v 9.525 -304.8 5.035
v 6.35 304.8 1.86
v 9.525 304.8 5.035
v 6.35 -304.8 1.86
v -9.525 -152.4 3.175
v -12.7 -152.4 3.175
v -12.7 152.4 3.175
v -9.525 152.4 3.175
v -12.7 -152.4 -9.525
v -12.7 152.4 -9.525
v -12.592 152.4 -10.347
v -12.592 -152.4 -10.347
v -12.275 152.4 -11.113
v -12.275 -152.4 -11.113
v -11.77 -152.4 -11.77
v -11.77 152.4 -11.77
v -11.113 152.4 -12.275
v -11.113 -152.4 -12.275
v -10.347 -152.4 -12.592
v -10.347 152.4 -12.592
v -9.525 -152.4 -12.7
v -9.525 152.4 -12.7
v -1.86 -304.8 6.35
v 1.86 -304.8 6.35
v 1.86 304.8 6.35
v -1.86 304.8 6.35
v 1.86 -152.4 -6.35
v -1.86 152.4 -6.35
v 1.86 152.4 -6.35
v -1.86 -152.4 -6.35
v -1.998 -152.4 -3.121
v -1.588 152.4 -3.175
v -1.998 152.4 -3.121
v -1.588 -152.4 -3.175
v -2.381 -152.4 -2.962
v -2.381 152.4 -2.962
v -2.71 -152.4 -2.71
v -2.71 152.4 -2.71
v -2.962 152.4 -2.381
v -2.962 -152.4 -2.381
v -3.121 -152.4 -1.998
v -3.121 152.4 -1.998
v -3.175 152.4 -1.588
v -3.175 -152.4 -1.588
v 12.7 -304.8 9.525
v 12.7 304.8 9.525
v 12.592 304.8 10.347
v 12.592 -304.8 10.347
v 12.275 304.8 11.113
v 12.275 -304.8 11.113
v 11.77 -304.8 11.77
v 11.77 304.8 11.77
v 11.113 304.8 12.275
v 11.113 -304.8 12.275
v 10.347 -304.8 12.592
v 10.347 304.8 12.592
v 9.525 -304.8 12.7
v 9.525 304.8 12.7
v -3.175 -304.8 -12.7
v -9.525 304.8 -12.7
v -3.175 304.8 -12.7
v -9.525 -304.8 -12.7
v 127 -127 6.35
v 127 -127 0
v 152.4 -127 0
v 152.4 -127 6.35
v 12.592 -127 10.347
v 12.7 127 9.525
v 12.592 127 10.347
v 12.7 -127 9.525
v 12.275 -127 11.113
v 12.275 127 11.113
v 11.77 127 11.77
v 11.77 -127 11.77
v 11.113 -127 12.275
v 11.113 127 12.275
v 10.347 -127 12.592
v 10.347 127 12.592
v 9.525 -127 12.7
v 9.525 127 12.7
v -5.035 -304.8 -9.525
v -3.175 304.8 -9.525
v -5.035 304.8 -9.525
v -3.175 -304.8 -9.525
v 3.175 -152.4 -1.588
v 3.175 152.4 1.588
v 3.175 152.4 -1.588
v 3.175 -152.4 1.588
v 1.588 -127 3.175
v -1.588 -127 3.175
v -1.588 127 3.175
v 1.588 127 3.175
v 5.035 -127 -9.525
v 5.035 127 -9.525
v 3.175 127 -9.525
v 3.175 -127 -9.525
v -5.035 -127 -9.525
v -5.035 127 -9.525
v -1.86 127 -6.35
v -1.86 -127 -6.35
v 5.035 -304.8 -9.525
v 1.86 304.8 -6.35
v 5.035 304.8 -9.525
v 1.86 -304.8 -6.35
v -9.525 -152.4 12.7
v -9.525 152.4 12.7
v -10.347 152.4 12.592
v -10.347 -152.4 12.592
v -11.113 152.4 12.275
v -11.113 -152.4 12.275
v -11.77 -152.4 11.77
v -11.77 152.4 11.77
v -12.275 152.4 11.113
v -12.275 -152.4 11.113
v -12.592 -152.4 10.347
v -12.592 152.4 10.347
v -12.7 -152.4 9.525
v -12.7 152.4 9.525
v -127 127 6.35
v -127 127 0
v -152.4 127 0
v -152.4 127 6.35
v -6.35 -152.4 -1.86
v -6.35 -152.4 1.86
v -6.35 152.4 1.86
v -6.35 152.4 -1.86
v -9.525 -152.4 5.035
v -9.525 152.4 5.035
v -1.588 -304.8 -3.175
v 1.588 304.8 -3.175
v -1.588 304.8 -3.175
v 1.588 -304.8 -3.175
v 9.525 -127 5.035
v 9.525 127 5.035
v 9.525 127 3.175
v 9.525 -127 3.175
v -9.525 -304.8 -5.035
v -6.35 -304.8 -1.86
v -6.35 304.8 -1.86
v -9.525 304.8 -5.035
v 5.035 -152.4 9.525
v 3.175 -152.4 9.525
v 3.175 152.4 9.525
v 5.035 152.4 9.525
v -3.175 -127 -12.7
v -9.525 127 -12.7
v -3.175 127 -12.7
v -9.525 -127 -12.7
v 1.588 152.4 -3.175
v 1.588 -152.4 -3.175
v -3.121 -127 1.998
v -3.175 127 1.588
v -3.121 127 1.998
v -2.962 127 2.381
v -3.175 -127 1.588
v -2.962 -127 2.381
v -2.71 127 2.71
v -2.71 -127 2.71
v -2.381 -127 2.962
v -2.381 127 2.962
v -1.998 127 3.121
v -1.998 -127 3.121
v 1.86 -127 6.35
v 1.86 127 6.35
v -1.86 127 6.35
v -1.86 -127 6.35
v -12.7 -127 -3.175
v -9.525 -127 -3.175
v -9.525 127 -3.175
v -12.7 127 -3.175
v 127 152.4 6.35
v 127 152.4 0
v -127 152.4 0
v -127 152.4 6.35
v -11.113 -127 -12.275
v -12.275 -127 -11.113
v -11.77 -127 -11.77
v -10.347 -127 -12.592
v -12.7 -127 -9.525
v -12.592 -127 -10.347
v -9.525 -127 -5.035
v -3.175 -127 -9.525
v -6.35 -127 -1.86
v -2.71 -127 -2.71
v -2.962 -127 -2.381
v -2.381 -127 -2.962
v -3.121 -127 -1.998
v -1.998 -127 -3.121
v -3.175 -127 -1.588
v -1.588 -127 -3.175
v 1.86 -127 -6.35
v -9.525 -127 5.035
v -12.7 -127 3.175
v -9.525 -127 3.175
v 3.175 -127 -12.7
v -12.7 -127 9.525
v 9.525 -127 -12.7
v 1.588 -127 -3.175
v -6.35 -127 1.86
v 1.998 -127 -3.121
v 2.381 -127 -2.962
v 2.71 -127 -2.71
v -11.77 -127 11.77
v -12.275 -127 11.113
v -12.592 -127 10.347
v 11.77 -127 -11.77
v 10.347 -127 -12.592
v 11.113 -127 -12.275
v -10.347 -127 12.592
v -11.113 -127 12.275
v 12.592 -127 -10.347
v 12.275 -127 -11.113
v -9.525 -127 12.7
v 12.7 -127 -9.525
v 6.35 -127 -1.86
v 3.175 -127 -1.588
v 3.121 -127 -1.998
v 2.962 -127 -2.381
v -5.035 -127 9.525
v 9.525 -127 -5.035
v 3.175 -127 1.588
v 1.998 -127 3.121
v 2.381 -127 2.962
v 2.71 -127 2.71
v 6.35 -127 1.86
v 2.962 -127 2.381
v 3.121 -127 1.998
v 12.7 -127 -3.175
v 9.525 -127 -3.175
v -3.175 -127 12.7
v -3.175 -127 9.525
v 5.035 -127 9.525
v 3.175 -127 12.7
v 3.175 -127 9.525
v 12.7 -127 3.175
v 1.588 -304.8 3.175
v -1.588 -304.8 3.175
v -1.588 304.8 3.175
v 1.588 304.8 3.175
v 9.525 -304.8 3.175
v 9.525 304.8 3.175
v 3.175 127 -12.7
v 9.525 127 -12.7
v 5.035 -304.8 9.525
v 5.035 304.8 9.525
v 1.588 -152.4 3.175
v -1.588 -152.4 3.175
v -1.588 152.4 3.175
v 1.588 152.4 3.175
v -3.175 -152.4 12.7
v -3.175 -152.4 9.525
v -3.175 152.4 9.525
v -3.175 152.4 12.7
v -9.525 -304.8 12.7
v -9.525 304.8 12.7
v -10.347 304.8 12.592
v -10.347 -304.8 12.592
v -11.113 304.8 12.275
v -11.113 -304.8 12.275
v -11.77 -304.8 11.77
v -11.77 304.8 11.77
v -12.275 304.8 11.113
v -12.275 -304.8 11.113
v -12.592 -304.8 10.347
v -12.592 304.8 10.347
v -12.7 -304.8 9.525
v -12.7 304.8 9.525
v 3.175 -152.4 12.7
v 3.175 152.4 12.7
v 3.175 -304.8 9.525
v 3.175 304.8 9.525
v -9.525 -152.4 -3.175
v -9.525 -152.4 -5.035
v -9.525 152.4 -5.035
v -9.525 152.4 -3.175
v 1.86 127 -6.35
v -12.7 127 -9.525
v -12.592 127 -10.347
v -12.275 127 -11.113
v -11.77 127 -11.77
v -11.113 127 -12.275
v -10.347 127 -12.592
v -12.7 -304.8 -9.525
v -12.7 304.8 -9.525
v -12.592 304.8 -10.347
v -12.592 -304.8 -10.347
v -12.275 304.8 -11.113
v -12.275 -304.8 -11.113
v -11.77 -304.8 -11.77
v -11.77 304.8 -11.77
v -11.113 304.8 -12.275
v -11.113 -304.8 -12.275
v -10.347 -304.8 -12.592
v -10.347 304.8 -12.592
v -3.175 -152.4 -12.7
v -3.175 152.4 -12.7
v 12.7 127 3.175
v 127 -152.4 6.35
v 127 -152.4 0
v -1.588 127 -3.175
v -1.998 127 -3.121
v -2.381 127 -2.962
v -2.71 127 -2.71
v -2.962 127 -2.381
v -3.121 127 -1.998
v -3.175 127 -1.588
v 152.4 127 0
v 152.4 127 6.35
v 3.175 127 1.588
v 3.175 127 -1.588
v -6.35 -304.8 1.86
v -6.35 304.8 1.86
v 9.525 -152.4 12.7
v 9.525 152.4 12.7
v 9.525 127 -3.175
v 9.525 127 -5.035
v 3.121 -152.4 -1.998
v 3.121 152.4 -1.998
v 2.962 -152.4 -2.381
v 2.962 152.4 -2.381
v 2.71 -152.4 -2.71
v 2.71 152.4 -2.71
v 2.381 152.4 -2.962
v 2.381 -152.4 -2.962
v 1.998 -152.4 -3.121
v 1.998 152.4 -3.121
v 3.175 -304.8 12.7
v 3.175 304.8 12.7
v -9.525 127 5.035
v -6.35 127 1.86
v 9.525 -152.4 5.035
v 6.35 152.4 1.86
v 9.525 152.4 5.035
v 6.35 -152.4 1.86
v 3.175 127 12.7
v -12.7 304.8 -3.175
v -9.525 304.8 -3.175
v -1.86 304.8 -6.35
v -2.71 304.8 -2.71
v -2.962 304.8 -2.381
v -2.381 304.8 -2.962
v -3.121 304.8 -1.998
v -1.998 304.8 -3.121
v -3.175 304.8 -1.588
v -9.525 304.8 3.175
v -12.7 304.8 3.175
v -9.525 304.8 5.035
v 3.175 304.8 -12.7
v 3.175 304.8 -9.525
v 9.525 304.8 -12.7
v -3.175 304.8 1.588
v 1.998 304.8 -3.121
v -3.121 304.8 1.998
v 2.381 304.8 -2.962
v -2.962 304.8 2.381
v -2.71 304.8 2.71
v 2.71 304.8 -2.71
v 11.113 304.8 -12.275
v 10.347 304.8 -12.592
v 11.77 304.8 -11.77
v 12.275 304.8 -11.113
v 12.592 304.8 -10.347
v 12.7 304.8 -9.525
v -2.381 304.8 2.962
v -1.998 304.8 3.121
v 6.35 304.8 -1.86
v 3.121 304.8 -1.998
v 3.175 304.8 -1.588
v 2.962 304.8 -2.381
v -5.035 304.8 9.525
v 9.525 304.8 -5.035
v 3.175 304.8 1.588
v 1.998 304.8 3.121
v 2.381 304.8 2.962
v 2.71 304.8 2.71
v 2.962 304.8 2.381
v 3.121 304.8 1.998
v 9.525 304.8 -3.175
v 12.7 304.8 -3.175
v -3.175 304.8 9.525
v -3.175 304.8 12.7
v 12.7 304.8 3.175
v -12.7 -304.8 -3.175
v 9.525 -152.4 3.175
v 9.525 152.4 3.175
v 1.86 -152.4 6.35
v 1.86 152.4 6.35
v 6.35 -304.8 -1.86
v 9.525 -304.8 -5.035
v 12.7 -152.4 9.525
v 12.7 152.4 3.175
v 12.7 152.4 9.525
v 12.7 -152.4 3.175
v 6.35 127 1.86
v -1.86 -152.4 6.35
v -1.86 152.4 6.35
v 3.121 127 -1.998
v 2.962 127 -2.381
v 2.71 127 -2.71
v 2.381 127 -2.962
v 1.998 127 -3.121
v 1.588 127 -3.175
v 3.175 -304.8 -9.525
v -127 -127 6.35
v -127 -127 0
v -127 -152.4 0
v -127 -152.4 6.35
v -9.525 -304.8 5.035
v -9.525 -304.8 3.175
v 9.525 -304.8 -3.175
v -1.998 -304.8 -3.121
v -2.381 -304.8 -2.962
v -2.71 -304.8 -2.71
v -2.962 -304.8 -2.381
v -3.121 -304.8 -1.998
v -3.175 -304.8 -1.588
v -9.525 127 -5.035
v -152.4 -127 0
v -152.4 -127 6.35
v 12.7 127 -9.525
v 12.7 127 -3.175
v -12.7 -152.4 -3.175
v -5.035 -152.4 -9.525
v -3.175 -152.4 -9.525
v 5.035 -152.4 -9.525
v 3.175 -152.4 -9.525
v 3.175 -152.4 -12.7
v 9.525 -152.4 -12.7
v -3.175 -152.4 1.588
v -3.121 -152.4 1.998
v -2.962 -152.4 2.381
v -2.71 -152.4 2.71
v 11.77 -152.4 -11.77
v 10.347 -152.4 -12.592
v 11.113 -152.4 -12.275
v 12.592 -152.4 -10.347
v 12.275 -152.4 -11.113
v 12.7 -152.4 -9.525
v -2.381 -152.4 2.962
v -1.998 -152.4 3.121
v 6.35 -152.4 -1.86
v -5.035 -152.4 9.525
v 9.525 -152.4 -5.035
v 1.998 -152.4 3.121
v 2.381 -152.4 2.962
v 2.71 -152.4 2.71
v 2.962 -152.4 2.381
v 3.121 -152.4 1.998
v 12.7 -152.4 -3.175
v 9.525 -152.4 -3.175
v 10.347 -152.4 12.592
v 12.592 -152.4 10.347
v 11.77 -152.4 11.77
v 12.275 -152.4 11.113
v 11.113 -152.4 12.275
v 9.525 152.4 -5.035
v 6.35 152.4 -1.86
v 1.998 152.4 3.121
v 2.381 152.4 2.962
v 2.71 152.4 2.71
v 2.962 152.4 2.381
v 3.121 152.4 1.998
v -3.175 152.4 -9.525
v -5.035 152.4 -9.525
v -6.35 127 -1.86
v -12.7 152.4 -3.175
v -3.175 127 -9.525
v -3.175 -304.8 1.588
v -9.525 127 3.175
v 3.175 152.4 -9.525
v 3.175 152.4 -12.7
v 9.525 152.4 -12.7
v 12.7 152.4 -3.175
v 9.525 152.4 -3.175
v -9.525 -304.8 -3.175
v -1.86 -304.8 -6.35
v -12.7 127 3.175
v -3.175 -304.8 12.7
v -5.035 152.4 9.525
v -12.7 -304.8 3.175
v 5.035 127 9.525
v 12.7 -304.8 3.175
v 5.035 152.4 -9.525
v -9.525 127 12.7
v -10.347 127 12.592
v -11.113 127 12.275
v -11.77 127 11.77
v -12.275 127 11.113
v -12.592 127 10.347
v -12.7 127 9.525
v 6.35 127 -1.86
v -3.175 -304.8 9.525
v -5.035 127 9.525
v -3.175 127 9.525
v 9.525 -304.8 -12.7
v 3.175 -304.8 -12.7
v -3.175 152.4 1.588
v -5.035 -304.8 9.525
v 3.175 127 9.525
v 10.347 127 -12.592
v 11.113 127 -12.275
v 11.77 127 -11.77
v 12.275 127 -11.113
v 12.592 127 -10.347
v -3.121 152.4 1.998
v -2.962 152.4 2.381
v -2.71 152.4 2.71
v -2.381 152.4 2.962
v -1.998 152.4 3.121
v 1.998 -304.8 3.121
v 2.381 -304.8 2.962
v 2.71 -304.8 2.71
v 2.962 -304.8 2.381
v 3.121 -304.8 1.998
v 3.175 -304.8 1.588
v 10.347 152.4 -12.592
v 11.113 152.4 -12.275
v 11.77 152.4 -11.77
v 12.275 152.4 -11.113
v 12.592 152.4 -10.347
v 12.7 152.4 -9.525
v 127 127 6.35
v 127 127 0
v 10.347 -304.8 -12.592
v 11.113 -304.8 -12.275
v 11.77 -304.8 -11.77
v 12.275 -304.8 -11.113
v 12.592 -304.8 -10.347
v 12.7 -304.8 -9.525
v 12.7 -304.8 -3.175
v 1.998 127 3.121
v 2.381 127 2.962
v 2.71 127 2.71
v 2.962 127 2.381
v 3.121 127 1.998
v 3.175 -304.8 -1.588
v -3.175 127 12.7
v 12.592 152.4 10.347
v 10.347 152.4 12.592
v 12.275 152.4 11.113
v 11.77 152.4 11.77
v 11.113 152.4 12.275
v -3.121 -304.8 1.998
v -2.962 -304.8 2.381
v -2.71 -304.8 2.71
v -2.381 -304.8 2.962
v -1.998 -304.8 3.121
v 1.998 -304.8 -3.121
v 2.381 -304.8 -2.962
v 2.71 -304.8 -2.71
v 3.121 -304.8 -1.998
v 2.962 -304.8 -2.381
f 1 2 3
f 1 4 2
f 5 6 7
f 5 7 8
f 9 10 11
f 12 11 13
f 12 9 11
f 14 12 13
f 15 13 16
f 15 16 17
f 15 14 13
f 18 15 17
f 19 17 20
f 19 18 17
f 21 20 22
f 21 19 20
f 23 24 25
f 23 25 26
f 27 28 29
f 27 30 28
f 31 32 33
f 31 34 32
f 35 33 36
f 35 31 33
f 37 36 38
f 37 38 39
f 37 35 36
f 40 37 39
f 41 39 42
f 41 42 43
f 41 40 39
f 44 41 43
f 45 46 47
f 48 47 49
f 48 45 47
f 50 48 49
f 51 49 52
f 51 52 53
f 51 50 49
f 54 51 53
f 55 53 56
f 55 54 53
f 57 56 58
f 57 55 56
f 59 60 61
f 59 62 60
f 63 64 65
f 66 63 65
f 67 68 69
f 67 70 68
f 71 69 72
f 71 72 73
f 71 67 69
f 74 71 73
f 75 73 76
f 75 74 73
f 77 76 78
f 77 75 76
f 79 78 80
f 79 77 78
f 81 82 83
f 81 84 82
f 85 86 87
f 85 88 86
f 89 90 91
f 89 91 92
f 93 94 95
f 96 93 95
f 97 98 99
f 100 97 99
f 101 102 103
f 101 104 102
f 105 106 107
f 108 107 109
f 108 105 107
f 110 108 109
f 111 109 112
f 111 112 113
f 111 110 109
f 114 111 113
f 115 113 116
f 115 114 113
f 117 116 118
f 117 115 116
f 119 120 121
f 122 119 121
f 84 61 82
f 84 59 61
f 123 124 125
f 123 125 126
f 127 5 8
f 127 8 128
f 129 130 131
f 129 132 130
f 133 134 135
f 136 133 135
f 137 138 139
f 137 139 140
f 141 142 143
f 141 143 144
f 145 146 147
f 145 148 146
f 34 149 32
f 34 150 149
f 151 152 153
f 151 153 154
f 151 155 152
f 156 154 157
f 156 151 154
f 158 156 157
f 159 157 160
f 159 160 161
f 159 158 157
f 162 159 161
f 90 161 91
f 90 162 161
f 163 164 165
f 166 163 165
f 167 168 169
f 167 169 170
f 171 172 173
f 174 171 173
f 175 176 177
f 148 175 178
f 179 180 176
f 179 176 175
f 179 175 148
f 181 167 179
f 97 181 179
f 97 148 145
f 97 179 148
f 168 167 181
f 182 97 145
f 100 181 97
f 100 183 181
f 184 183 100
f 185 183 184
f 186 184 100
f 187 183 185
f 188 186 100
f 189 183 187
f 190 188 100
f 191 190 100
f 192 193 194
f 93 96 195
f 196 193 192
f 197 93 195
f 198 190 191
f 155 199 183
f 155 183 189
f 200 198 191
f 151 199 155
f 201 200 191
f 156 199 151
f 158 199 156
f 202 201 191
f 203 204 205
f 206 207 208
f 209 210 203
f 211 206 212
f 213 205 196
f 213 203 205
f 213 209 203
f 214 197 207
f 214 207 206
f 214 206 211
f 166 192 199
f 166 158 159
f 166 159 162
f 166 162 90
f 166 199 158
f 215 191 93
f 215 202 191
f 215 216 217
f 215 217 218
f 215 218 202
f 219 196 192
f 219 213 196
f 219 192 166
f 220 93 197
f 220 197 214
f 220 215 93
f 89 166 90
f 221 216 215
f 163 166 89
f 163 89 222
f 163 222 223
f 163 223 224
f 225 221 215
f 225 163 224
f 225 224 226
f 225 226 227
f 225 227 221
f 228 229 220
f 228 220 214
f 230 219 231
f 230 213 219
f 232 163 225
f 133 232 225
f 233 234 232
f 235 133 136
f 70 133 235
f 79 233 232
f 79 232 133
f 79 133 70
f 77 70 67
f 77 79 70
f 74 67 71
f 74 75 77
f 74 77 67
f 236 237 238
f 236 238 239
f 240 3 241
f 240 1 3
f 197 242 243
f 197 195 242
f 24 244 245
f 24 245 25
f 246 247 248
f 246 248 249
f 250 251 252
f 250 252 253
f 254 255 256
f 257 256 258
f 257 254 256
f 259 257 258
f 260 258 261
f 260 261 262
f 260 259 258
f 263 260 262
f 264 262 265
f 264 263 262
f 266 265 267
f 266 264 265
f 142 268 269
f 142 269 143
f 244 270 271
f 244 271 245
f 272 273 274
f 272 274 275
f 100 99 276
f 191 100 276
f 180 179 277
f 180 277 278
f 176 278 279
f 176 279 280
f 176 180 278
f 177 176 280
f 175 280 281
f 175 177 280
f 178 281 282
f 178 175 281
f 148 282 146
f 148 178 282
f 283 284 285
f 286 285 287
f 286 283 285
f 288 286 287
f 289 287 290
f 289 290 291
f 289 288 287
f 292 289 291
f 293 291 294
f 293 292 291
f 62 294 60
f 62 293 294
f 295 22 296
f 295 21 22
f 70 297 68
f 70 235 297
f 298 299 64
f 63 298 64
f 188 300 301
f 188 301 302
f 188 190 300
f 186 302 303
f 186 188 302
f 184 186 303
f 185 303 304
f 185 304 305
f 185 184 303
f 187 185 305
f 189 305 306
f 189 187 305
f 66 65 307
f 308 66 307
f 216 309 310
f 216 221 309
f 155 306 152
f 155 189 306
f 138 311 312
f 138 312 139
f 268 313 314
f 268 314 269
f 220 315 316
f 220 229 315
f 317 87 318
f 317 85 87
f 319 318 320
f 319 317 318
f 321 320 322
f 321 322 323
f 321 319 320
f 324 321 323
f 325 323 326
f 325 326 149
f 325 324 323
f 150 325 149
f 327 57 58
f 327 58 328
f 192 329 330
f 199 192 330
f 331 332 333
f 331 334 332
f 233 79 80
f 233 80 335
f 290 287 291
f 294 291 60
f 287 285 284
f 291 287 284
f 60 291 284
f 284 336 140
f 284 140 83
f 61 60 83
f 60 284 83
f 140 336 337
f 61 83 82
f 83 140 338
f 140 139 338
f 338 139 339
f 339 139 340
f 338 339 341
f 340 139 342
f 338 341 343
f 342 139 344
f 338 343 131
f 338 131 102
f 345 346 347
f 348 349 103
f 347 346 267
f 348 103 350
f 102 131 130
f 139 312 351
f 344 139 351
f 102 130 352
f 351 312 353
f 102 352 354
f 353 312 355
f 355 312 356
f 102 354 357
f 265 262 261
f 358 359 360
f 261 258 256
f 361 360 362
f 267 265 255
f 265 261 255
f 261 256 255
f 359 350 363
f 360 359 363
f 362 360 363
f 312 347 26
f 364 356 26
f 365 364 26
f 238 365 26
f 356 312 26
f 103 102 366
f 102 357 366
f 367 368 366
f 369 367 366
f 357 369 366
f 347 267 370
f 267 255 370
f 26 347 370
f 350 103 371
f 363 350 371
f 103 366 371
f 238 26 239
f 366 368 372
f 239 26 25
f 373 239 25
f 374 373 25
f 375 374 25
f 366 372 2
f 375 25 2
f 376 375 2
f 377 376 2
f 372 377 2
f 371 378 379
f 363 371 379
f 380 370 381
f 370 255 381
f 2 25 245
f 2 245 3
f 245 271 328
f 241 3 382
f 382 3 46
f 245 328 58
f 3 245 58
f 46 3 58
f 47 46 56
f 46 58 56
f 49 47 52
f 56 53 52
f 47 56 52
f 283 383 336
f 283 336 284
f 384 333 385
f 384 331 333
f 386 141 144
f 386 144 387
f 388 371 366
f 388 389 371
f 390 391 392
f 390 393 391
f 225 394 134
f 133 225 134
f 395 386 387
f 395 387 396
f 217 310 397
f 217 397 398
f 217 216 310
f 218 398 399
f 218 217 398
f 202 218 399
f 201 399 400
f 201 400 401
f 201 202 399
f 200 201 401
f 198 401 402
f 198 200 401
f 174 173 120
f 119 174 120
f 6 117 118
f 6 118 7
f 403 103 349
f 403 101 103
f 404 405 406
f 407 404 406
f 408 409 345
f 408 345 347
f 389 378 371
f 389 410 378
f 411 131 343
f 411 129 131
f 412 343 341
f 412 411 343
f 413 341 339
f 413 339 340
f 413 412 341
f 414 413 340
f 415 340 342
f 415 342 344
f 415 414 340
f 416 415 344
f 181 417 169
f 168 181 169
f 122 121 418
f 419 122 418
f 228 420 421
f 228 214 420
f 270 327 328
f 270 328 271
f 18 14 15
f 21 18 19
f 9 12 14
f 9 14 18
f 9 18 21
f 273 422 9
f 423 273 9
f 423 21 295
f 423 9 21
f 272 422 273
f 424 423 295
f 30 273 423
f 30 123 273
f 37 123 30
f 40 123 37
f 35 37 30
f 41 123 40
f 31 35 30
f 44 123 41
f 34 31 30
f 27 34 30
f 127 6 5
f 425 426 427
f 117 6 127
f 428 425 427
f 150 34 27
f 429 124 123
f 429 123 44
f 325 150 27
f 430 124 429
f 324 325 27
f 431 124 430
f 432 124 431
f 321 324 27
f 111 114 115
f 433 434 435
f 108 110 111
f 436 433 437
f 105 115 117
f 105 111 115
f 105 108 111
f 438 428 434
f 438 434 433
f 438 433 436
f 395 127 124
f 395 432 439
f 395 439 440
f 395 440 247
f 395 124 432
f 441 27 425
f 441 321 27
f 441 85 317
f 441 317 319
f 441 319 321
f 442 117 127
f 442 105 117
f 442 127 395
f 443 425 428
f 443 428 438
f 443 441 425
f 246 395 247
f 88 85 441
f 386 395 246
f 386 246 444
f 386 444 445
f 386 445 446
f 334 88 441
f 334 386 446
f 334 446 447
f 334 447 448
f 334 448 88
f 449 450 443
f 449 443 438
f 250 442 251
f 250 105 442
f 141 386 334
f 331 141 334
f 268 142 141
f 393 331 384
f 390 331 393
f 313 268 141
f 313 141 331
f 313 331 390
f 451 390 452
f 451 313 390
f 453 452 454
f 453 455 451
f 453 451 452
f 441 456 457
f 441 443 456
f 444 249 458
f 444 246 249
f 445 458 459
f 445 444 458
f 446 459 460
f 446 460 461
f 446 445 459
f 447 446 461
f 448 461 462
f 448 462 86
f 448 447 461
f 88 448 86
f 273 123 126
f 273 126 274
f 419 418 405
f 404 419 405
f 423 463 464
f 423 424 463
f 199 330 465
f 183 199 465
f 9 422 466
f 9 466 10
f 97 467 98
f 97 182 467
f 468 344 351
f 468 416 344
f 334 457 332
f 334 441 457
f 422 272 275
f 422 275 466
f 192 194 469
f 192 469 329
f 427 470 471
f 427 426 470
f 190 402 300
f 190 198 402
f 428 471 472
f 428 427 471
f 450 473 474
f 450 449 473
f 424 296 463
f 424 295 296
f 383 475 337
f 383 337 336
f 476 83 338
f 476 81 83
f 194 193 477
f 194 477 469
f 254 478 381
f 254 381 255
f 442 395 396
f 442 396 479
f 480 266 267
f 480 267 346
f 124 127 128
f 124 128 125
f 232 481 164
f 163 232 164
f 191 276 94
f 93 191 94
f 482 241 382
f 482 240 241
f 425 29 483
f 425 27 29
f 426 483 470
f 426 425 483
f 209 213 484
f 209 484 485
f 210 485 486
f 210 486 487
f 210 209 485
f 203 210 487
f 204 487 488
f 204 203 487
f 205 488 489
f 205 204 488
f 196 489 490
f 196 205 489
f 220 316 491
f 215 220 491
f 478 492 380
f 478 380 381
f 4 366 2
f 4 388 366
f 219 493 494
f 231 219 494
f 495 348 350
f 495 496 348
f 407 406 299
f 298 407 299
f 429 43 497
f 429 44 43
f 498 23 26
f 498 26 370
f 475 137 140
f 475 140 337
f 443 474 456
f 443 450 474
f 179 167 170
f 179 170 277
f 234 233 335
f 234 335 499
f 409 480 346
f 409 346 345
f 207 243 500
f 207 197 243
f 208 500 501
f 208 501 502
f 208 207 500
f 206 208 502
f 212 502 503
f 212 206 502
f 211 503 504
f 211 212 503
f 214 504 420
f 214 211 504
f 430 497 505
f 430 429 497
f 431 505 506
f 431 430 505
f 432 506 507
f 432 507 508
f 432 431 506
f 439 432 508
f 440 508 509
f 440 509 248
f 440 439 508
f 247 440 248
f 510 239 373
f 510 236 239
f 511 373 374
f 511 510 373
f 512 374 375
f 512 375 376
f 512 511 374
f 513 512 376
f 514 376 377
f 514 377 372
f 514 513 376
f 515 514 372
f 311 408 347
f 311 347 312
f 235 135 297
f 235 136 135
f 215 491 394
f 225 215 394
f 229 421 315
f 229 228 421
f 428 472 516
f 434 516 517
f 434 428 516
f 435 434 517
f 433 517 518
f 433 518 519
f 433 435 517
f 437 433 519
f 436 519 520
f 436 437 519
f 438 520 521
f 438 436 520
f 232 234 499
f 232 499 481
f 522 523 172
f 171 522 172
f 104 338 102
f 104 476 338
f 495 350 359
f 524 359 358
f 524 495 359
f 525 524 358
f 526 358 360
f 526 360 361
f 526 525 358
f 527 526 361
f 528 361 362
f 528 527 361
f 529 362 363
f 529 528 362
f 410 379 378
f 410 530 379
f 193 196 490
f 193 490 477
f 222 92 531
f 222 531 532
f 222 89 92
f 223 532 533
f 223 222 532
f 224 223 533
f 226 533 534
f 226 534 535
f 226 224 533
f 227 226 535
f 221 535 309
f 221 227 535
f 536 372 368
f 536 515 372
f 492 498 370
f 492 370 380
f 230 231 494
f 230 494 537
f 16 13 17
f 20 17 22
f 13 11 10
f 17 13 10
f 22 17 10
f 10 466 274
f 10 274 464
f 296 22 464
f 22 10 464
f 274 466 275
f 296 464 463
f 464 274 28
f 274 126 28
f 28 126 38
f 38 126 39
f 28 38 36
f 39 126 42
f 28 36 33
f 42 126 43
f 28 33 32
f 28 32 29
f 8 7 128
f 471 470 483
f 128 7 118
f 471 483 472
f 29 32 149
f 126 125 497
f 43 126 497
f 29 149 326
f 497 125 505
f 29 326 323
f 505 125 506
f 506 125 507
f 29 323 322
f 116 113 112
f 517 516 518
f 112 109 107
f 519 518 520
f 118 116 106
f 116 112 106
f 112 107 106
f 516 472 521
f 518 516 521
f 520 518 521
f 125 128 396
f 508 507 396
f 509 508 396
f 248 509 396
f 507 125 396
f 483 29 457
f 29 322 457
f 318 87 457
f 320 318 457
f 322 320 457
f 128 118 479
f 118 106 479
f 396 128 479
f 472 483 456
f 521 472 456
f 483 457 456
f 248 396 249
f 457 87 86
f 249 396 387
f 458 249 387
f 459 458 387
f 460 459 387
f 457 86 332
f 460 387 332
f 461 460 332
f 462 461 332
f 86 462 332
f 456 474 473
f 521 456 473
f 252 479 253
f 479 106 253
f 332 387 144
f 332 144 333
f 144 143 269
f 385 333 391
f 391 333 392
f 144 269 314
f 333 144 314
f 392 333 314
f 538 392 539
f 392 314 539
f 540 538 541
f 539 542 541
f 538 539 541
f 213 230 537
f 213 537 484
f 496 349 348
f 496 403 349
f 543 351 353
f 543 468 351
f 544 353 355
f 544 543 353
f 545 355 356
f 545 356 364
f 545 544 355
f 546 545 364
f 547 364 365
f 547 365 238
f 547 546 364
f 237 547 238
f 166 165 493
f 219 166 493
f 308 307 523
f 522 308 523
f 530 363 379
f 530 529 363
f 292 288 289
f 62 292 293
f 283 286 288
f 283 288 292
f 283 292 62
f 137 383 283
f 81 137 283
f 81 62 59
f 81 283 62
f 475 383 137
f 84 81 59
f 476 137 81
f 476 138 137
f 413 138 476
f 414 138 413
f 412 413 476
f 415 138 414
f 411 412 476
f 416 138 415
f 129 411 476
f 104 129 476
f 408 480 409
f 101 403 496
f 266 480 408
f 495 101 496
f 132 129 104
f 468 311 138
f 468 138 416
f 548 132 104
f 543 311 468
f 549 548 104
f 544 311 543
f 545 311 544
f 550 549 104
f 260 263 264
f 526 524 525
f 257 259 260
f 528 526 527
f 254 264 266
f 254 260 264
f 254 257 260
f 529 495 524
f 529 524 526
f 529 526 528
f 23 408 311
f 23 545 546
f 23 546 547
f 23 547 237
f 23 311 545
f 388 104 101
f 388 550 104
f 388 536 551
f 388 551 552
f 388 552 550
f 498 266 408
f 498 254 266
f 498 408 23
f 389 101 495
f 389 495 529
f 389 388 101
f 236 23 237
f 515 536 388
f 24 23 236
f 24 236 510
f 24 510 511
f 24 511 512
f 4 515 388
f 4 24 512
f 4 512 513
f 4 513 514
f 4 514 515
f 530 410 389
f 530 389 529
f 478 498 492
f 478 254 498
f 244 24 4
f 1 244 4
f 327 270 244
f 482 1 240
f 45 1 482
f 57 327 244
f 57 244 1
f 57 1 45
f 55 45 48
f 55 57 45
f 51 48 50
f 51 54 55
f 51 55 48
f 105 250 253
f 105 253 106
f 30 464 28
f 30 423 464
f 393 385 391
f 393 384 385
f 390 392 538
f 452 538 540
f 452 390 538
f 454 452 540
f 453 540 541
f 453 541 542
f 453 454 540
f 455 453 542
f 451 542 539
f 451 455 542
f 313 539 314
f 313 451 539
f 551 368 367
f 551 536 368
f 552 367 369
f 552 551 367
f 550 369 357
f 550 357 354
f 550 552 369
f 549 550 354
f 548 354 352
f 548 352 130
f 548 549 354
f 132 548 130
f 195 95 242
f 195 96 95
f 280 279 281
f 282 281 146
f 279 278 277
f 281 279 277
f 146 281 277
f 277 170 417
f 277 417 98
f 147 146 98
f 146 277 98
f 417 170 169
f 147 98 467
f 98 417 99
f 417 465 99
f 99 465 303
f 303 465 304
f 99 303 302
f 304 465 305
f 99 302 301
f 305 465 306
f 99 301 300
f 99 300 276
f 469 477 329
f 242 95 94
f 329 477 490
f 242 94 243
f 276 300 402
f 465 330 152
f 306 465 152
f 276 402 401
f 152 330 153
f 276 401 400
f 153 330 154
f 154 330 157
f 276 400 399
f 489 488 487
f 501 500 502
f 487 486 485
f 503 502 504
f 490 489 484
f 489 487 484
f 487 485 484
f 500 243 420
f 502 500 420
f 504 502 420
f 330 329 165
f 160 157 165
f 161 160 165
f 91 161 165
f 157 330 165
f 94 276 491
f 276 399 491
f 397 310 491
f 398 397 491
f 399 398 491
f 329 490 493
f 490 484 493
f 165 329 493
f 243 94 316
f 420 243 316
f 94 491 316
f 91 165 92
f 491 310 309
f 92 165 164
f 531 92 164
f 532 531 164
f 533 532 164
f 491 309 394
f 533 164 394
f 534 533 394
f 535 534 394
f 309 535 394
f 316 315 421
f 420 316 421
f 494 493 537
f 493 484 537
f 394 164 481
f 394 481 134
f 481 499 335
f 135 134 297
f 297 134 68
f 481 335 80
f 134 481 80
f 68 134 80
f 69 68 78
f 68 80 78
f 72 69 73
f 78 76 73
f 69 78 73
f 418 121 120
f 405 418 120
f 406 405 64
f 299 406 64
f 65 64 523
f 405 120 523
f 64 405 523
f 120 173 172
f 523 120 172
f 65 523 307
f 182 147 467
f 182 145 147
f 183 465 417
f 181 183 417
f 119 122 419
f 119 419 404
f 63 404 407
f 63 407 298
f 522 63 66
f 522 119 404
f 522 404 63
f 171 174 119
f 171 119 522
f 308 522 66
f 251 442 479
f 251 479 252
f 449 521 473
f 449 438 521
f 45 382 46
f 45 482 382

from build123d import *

# Parameters (mm, degrees)
F2_DEPTH = 127
F4_DEPTH = 304.8
F6_DEPTH = 152.4
F8_DEPTH = 6.35


with BuildPart() as f2:
    # F0 (on Front) → F2 (new body, symmetric)
    with BuildSketch(Plane.XZ):
        with BuildLine():
            ThreePointArc((12.7, 9.525), (11.7700640303, 11.7700640303), (9.525, 12.7))
            Line((9.525, 12.7), (3.175, 12.7))
            Line((3.175, 12.7), (3.175, 9.525))
            Line((3.175, 9.525), (5.0348719395, 9.525))
            Line((5.0348719395, 9.525), (1.8598719395, 6.35))
            Line((1.8598719395, 6.35), (0, 6.35))
            Line((0, 6.35), (-1.8598719395, 6.35))
            Line((-1.8598719395, 6.35), (-5.0348719395, 9.525))
            Line((-5.0348719395, 9.525), (-3.175, 9.525))
            Line((-3.175, 9.525), (-3.175, 12.7))
            Line((-3.175, 12.7), (-9.525, 12.7))
            ThreePointArc((-9.525, 12.7), (-11.7700640303, 11.7700640303), (-12.7, 9.525))
            Line((-12.7, 9.525), (-12.7, 3.175))
            Line((-12.7, 3.175), (-9.525, 3.175))
            Line((-9.525, 3.175), (-9.525, 5.0348719395))
            Line((-9.525, 5.0348719395), (-6.35, 1.8598719395))
            Line((-6.35, 1.8598719395), (-6.35, 0))
            Line((-6.35, 0), (-6.35, -1.8598719395))
            Line((-6.35, -1.8598719395), (-9.525, -5.0348719395))
            Line((-9.525, -5.0348719395), (-9.525, -3.175))
            Line((-9.525, -3.175), (-12.7, -3.175))
            Line((-12.7, -3.175), (-12.7, -9.525))
            ThreePointArc((-12.7, -9.525), (-11.7700640303, -11.7700640303), (-9.525, -12.7))
            Line((-9.525, -12.7), (-3.175, -12.7))
            Line((-3.175, -12.7), (-3.175, -9.525))
            Line((-3.175, -9.525), (-5.0348719395, -9.525))
            Line((-5.0348719395, -9.525), (-1.8598719395, -6.35))
            Line((-1.8598719395, -6.35), (0, -6.35))
            Line((0, -6.35), (1.8598719395, -6.35))
            Line((1.8598719395, -6.35), (5.0348719395, -9.525))
            Line((5.0348719395, -9.525), (3.175, -9.525))
            Line((3.175, -9.525), (3.175, -12.7))
            Line((3.175, -12.7), (9.525, -12.7))
            ThreePointArc((9.525, -12.7), (11.7700640303, -11.7700640303), (12.7, -9.525))
            Line((12.7, -9.525), (12.7, -3.175))
            Line((12.7, -3.175), (9.525, -3.175))
            Line((9.525, -3.175), (9.525, -5.0348719395))
            Line((9.525, -5.0348719395), (6.35, -1.8598719395))
            Line((6.35, -1.8598719395), (6.35, 0))
            Line((6.35, 0), (6.35, 1.8598719395))
            Line((6.35, 1.8598719395), (9.525, 5.0348719395))
            Line((9.525, 5.0348719395), (9.525, 3.175))
            Line((9.525, 3.175), (12.7, 3.175))
            Line((12.7, 3.175), (12.7, 9.525))
        make_face()
        with BuildLine():
            Line((-1.5875, 3.175), (0, 3.175))
            Line((0, 3.175), (1.5875, 3.175))
            ThreePointArc((1.5875, 3.175), (2.7100320151, 2.7100320151), (3.175, 1.5875))
            Line((3.175, 1.5875), (3.175, 0))
            Line((3.175, 0), (3.175, -1.5875))
            ThreePointArc((3.175, -1.5875), (2.7100320151, -2.7100320151), (1.5875, -3.175))
            Line((1.5875, -3.175), (0, -3.175))
            Line((0, -3.175), (-1.5875, -3.175))
            ThreePointArc((-1.5875, -3.175), (-2.7100320151, -2.7100320151), (-3.175, -1.5875))
            Line((-3.175, -1.5875), (-3.175, 0))
            Line((-3.175, 0), (-3.175, 1.5875))
            ThreePointArc((-3.175, 1.5875), (-2.7100320151, 2.7100320151), (-1.5875, 3.175))
        make_face(mode=Mode.SUBTRACT)
    extrude(amount=F2_DEPTH, both=True)


with BuildPart() as f4:
    # F0 (on Front) → F4 (new body, symmetric)
    with BuildSketch(Plane.XZ):
        with BuildLine():
            ThreePointArc((12.7, 9.525), (11.7700640303, 11.7700640303), (9.525, 12.7))
            Line((9.525, 12.7), (3.175, 12.7))
            Line((3.175, 12.7), (3.175, 9.525))
            Line((3.175, 9.525), (5.0348719395, 9.525))
            Line((5.0348719395, 9.525), (1.8598719395, 6.35))
            Line((1.8598719395, 6.35), (0, 6.35))
            Line((0, 6.35), (-1.8598719395, 6.35))
            Line((-1.8598719395, 6.35), (-5.0348719395, 9.525))
            Line((-5.0348719395, 9.525), (-3.175, 9.525))
            Line((-3.175, 9.525), (-3.175, 12.7))
            Line((-3.175, 12.7), (-9.525, 12.7))
            ThreePointArc((-9.525, 12.7), (-11.7700640303, 11.7700640303), (-12.7, 9.525))
            Line((-12.7, 9.525), (-12.7, 3.175))
            Line((-12.7, 3.175), (-9.525, 3.175))
            Line((-9.525, 3.175), (-9.525, 5.0348719395))
            Line((-9.525, 5.0348719395), (-6.35, 1.8598719395))
            Line((-6.35, 1.8598719395), (-6.35, 0))
            Line((-6.35, 0), (-6.35, -1.8598719395))
            Line((-6.35, -1.8598719395), (-9.525, -5.0348719395))
            Line((-9.525, -5.0348719395), (-9.525, -3.175))
            Line((-9.525, -3.175), (-12.7, -3.175))
            Line((-12.7, -3.175), (-12.7, -9.525))
            ThreePointArc((-12.7, -9.525), (-11.7700640303, -11.7700640303), (-9.525, -12.7))
            Line((-9.525, -12.7), (-3.175, -12.7))
            Line((-3.175, -12.7), (-3.175, -9.525))
            Line((-3.175, -9.525), (-5.0348719395, -9.525))
            Line((-5.0348719395, -9.525), (-1.8598719395, -6.35))
            Line((-1.8598719395, -6.35), (0, -6.35))
            Line((0, -6.35), (1.8598719395, -6.35))
            Line((1.8598719395, -6.35), (5.0348719395, -9.525))
            Line((5.0348719395, -9.525), (3.175, -9.525))
            Line((3.175, -9.525), (3.175, -12.7))
            Line((3.175, -12.7), (9.525, -12.7))
            ThreePointArc((9.525, -12.7), (11.7700640303, -11.7700640303), (12.7, -9.525))
            Line((12.7, -9.525), (12.7, -3.175))
            Line((12.7, -3.175), (9.525, -3.175))
            Line((9.525, -3.175), (9.525, -5.0348719395))
            Line((9.525, -5.0348719395), (6.35, -1.8598719395))
            Line((6.35, -1.8598719395), (6.35, 0))
            Line((6.35, 0), (6.35, 1.8598719395))
            Line((6.35, 1.8598719395), (9.525, 5.0348719395))
            Line((9.525, 5.0348719395), (9.525, 3.175))
            Line((9.525, 3.175), (12.7, 3.175))
            Line((12.7, 3.175), (12.7, 9.525))
        make_face()
        with BuildLine():
            Line((-1.5875, 3.175), (0, 3.175))
            Line((0, 3.175), (1.5875, 3.175))
            ThreePointArc((1.5875, 3.175), (2.7100320151, 2.7100320151), (3.175, 1.5875))
            Line((3.175, 1.5875), (3.175, 0))
            Line((3.175, 0), (3.175, -1.5875))
            ThreePointArc((3.175, -1.5875), (2.7100320151, -2.7100320151), (1.5875, -3.175))
            Line((1.5875, -3.175), (0, -3.175))
            Line((0, -3.175), (-1.5875, -3.175))
            ThreePointArc((-1.5875, -3.175), (-2.7100320151, -2.7100320151), (-3.175, -1.5875))
            Line((-3.175, -1.5875), (-3.175, 0))
            Line((-3.175, 0), (-3.175, 1.5875))
            ThreePointArc((-3.175, 1.5875), (-2.7100320151, 2.7100320151), (-1.5875, 3.175))
        make_face(mode=Mode.SUBTRACT)
    extrude(amount=F4_DEPTH, both=True)


with BuildPart() as f6:
    # F0 (on Front) → F6 (new body, symmetric)
    with BuildSketch(Plane.XZ):
        with BuildLine():
            ThreePointArc((12.7, 9.525), (11.7700640303, 11.7700640303), (9.525, 12.7))
            Line((9.525, 12.7), (3.175, 12.7))
            Line((3.175, 12.7), (3.175, 9.525))
            Line((3.175, 9.525), (5.0348719395, 9.525))
            Line((5.0348719395, 9.525), (1.8598719395, 6.35))
            Line((1.8598719395, 6.35), (0, 6.35))
            Line((0, 6.35), (-1.8598719395, 6.35))
            Line((-1.8598719395, 6.35), (-5.0348719395, 9.525))
            Line((-5.0348719395, 9.525), (-3.175, 9.525))
            Line((-3.175, 9.525), (-3.175, 12.7))
            Line((-3.175, 12.7), (-9.525, 12.7))
            ThreePointArc((-9.525, 12.7), (-11.7700640303, 11.7700640303), (-12.7, 9.525))
            Line((-12.7, 9.525), (-12.7, 3.175))
            Line((-12.7, 3.175), (-9.525, 3.175))
            Line((-9.525, 3.175), (-9.525, 5.0348719395))
            Line((-9.525, 5.0348719395), (-6.35, 1.8598719395))
            Line((-6.35, 1.8598719395), (-6.35, 0))
            Line((-6.35, 0), (-6.35, -1.8598719395))
            Line((-6.35, -1.8598719395), (-9.525, -5.0348719395))
            Line((-9.525, -5.0348719395), (-9.525, -3.175))
            Line((-9.525, -3.175), (-12.7, -3.175))
            Line((-12.7, -3.175), (-12.7, -9.525))
            ThreePointArc((-12.7, -9.525), (-11.7700640303, -11.7700640303), (-9.525, -12.7))
            Line((-9.525, -12.7), (-3.175, -12.7))
            Line((-3.175, -12.7), (-3.175, -9.525))
            Line((-3.175, -9.525), (-5.0348719395, -9.525))
            Line((-5.0348719395, -9.525), (-1.8598719395, -6.35))
            Line((-1.8598719395, -6.35), (0, -6.35))
            Line((0, -6.35), (1.8598719395, -6.35))
            Line((1.8598719395, -6.35), (5.0348719395, -9.525))
            Line((5.0348719395, -9.525), (3.175, -9.525))
            Line((3.175, -9.525), (3.175, -12.7))
            Line((3.175, -12.7), (9.525, -12.7))
            ThreePointArc((9.525, -12.7), (11.7700640303, -11.7700640303), (12.7, -9.525))
            Line((12.7, -9.525), (12.7, -3.175))
            Line((12.7, -3.175), (9.525, -3.175))
            Line((9.525, -3.175), (9.525, -5.0348719395))
            Line((9.525, -5.0348719395), (6.35, -1.8598719395))
            Line((6.35, -1.8598719395), (6.35, 0))
            Line((6.35, 0), (6.35, 1.8598719395))
            Line((6.35, 1.8598719395), (9.525, 5.0348719395))
            Line((9.525, 5.0348719395), (9.525, 3.175))
            Line((9.525, 3.175), (12.7, 3.175))
            Line((12.7, 3.175), (12.7, 9.525))
        make_face()
        with BuildLine():
            Line((-1.5875, 3.175), (0, 3.175))
            Line((0, 3.175), (1.5875, 3.175))
            ThreePointArc((1.5875, 3.175), (2.7100320151, 2.7100320151), (3.175, 1.5875))
            Line((3.175, 1.5875), (3.175, 0))
            Line((3.175, 0), (3.175, -1.5875))
            ThreePointArc((3.175, -1.5875), (2.7100320151, -2.7100320151), (1.5875, -3.175))
            Line((1.5875, -3.175), (0, -3.175))
            Line((0, -3.175), (-1.5875, -3.175))
            ThreePointArc((-1.5875, -3.175), (-2.7100320151, -2.7100320151), (-3.175, -1.5875))
            Line((-3.175, -1.5875), (-3.175, 0))
            Line((-3.175, 0), (-3.175, 1.5875))
            ThreePointArc((-3.175, 1.5875), (-2.7100320151, 2.7100320151), (-1.5875, 3.175))
        make_face(mode=Mode.SUBTRACT)
    extrude(amount=F6_DEPTH, both=True)


with BuildPart() as f8:
    # F7 (on Top) → F8 (new body)
    with BuildSketch(Plane.XY):
        Polygon((127, 127), (127, 152.4), (-127, 152.4), (-127, 127), (-152.4, 127), (-152.4, -127), (-127, -127), (-127, -152.4), (127, -152.4), (127, -127), (152.4, -127), (152.4, 127), align=None)
    extrude(amount=F8_DEPTH)


solid = Compound([f2.part, f4.part, f6.part, f8.part])
